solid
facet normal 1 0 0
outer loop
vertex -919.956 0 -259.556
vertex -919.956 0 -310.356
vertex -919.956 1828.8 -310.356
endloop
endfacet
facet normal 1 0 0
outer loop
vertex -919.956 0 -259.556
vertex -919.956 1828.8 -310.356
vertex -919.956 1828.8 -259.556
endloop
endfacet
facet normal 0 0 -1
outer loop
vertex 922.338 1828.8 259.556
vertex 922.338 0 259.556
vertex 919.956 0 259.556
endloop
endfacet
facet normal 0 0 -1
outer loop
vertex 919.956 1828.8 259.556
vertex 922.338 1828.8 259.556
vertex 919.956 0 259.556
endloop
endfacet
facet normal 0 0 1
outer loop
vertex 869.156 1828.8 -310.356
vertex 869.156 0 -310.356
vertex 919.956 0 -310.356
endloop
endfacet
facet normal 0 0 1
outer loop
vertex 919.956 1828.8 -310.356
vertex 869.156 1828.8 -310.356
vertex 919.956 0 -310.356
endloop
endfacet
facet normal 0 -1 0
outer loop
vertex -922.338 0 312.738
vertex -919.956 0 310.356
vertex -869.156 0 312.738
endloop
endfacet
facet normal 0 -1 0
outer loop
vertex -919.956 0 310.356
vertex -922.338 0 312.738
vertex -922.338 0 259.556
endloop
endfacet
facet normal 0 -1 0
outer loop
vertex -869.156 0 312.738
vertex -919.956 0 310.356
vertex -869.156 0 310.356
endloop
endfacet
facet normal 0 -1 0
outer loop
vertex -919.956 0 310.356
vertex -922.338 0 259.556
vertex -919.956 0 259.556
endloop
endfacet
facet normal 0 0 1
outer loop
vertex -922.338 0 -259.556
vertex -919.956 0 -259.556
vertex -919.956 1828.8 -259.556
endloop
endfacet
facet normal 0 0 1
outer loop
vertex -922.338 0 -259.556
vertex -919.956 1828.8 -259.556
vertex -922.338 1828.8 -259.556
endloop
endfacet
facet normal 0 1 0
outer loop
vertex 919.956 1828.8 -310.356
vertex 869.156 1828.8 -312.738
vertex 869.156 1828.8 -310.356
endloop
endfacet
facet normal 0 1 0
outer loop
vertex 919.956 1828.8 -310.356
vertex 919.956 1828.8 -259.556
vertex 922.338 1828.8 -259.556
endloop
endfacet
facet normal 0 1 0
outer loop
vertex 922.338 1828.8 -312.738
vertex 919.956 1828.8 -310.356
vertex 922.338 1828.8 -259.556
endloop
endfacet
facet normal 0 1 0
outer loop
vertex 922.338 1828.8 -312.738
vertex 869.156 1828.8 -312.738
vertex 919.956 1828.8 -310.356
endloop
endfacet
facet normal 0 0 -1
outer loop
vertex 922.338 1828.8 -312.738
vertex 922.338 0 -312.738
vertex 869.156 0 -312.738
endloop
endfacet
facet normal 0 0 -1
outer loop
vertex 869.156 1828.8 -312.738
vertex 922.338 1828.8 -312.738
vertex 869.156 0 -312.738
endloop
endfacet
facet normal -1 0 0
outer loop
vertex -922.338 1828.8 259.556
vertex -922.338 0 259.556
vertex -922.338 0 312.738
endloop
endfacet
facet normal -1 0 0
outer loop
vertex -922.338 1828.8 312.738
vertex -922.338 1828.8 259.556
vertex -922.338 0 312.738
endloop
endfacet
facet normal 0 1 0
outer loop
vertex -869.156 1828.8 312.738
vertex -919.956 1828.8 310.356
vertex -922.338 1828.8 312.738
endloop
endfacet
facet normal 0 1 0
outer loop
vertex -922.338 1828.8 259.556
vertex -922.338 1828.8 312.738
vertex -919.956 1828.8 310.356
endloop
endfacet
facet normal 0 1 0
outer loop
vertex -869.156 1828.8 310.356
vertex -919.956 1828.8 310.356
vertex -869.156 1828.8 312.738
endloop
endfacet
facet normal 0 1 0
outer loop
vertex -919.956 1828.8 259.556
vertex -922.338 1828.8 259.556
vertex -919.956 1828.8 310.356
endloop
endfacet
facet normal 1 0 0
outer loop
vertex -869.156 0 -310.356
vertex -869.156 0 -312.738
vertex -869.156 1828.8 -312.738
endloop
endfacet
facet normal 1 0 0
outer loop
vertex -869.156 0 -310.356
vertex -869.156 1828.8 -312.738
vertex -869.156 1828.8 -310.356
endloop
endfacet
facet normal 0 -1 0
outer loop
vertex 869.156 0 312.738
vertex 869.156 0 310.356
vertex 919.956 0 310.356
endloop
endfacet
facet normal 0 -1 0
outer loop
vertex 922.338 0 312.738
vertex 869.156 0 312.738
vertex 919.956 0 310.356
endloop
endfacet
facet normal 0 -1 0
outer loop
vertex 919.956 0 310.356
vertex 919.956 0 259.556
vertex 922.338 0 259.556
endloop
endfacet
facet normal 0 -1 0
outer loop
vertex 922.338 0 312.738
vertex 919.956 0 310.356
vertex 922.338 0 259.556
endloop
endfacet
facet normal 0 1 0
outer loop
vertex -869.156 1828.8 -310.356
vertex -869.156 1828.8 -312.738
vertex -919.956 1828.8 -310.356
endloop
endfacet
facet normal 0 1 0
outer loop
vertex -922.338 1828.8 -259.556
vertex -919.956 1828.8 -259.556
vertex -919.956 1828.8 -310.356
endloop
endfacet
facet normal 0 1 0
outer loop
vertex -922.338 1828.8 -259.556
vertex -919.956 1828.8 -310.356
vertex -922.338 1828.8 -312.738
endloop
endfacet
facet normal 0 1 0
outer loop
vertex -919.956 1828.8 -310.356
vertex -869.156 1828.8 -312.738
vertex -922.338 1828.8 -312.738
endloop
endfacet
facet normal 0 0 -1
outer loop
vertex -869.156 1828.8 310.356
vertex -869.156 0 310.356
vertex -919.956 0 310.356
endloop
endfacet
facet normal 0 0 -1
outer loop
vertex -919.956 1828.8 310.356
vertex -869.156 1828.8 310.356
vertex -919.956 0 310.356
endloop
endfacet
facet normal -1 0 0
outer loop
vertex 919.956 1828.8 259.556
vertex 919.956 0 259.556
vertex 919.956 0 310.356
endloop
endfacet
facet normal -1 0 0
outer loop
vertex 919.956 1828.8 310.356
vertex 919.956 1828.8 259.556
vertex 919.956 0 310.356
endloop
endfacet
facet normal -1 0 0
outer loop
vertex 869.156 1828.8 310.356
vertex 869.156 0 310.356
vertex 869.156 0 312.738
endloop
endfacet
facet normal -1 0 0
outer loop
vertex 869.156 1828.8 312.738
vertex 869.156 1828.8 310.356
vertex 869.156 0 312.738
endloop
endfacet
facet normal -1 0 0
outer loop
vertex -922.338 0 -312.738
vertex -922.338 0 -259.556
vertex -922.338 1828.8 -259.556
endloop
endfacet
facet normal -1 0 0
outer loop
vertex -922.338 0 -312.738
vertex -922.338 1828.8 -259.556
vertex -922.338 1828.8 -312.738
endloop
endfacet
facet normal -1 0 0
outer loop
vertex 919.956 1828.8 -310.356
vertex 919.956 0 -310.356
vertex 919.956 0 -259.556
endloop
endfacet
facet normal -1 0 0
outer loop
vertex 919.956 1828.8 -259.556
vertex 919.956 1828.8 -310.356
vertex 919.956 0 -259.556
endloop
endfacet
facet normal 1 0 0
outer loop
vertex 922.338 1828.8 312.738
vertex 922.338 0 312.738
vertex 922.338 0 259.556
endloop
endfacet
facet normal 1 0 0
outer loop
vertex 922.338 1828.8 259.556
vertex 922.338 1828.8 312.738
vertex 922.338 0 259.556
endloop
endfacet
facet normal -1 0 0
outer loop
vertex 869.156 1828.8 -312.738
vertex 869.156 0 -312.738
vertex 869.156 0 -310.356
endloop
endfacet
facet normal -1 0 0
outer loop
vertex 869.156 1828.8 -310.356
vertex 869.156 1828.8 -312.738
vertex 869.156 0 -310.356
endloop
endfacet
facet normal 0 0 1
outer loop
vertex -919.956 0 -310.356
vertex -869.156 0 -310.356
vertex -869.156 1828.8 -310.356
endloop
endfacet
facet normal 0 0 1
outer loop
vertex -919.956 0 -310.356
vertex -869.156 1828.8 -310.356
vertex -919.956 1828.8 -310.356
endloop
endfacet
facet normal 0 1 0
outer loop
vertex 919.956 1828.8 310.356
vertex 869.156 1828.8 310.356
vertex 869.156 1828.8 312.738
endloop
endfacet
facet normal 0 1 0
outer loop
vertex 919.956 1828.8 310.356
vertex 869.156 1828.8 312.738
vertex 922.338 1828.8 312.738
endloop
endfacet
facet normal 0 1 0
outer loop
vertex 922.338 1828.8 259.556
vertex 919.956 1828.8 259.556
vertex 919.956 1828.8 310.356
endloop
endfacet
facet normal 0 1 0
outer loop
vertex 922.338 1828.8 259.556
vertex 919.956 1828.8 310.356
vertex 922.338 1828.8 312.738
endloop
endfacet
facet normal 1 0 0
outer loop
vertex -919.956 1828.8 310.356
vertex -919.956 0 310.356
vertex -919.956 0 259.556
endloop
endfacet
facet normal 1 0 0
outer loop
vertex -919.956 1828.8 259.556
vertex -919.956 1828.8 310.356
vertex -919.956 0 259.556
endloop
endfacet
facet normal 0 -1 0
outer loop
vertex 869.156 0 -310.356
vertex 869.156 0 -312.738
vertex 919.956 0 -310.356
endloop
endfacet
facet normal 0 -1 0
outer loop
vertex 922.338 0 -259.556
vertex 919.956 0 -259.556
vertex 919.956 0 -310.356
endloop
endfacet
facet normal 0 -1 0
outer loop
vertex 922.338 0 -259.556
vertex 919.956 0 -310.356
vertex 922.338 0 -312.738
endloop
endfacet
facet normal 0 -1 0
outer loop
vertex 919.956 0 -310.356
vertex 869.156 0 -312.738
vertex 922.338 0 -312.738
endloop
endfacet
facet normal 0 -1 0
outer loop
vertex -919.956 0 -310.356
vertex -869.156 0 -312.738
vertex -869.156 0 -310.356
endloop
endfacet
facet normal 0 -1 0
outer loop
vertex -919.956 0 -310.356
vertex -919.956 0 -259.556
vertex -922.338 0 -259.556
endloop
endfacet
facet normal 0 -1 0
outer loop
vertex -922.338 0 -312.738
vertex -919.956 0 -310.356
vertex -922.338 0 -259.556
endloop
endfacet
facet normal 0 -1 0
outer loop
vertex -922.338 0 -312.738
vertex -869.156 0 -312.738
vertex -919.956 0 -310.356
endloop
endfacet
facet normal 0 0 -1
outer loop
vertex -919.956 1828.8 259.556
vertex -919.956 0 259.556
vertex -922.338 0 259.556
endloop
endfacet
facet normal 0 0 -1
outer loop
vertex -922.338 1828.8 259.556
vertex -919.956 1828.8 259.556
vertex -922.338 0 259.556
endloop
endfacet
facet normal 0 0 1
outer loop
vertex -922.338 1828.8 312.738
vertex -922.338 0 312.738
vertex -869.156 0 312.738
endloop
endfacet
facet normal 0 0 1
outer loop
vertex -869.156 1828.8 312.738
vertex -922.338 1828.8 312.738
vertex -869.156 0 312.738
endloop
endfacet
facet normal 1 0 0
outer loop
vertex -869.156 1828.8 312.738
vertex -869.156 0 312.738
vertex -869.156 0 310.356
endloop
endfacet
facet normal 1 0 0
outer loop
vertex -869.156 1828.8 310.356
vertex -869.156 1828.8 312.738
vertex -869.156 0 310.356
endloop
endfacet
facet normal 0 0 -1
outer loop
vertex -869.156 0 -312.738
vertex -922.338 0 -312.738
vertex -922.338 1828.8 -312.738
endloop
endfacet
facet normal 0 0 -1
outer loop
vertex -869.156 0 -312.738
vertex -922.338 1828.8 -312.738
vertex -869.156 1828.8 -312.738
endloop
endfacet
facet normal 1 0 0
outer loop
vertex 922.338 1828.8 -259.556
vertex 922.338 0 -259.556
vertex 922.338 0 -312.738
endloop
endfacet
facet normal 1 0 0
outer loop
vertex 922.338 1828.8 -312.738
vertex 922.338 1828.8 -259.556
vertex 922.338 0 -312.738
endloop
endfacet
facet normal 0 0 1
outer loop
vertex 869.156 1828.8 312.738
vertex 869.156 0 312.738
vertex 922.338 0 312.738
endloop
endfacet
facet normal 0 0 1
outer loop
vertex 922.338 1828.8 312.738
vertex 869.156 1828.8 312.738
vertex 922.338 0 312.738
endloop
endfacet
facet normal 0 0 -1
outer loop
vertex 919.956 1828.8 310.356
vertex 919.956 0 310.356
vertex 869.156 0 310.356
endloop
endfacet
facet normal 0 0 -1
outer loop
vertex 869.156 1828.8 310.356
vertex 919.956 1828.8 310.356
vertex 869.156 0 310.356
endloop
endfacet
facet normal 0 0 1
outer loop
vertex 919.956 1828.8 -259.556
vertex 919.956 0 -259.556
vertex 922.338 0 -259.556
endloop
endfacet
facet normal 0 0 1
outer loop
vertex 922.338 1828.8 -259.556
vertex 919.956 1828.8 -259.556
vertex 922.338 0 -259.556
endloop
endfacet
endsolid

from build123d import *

# Parameters (mm, degrees)
BOSS_EXTRUDE1_DEPTH   = 1828.8
BOSS_EXTRUDE1_2_DEPTH = 1828.8
BOSS_EXTRUDE1_3_DEPTH = 1828.8
BOSS_EXTRUDE1_4_DEPTH = 1828.8


with BuildPart() as part:
    # Sketch1 → Boss-Extrude1 (new body)
    with BuildSketch(Plane(origin=(0, 0, 0), x_dir=(1, 0, 0), z_dir=(0, 1, 0))):
        Polygon((-922.3375, -312.7375), (-869.15625, -312.7375), (-869.15625, -310.35625), (-919.95625, -310.35625), (-919.95625, -259.55625), (-922.3375, -259.55625), align=None)
    extrude(amount=BOSS_EXTRUDE1_DEPTH)


with BuildPart() as body_2:
    # Sketch1 → Boss-Extrude1 2 (new body)
    with BuildSketch(Plane(origin=(0, 0, 0), x_dir=(1, 0, 0), z_dir=(0, 1, 0))):
        Polygon((-922.3375, 312.7375), (-869.15625, 312.7375), (-869.15625, 310.35625), (-919.95625, 310.35625), (-919.95625, 259.55625), (-922.3375, 259.55625), align=None)
    extrude(amount=BOSS_EXTRUDE1_2_DEPTH)


with BuildPart() as body_3:
    # Sketch1 → Boss-Extrude1 3 (new body)
    with BuildSketch(Plane(origin=(0, 0, 0), x_dir=(1, 0, 0), z_dir=(0, 1, 0))):
        Polygon((922.3375, -312.7375), (922.3375, -259.55625), (919.95625, -259.55625), (919.95625, -310.35625), (869.15625, -310.35625), (869.15625, -312.7375), align=None)
    extrude(amount=BOSS_EXTRUDE1_3_DEPTH)


with BuildPart() as body_4:
    # Sketch1 → Boss-Extrude1 4 (new body)
    with BuildSketch(Plane(origin=(0, 0, 0), x_dir=(1, 0, 0), z_dir=(0, 1, 0))):
        Polygon((869.15625, 312.7375), (869.15625, 310.35625), (919.95625, 310.35625), (919.95625, 259.55625), (922.3375, 259.55625), (922.3375, 312.7375), align=None)
    extrude(amount=BOSS_EXTRUDE1_4_DEPTH)


solid = Compound([part.part, body_2.part, body_3.part, body_4.part])
